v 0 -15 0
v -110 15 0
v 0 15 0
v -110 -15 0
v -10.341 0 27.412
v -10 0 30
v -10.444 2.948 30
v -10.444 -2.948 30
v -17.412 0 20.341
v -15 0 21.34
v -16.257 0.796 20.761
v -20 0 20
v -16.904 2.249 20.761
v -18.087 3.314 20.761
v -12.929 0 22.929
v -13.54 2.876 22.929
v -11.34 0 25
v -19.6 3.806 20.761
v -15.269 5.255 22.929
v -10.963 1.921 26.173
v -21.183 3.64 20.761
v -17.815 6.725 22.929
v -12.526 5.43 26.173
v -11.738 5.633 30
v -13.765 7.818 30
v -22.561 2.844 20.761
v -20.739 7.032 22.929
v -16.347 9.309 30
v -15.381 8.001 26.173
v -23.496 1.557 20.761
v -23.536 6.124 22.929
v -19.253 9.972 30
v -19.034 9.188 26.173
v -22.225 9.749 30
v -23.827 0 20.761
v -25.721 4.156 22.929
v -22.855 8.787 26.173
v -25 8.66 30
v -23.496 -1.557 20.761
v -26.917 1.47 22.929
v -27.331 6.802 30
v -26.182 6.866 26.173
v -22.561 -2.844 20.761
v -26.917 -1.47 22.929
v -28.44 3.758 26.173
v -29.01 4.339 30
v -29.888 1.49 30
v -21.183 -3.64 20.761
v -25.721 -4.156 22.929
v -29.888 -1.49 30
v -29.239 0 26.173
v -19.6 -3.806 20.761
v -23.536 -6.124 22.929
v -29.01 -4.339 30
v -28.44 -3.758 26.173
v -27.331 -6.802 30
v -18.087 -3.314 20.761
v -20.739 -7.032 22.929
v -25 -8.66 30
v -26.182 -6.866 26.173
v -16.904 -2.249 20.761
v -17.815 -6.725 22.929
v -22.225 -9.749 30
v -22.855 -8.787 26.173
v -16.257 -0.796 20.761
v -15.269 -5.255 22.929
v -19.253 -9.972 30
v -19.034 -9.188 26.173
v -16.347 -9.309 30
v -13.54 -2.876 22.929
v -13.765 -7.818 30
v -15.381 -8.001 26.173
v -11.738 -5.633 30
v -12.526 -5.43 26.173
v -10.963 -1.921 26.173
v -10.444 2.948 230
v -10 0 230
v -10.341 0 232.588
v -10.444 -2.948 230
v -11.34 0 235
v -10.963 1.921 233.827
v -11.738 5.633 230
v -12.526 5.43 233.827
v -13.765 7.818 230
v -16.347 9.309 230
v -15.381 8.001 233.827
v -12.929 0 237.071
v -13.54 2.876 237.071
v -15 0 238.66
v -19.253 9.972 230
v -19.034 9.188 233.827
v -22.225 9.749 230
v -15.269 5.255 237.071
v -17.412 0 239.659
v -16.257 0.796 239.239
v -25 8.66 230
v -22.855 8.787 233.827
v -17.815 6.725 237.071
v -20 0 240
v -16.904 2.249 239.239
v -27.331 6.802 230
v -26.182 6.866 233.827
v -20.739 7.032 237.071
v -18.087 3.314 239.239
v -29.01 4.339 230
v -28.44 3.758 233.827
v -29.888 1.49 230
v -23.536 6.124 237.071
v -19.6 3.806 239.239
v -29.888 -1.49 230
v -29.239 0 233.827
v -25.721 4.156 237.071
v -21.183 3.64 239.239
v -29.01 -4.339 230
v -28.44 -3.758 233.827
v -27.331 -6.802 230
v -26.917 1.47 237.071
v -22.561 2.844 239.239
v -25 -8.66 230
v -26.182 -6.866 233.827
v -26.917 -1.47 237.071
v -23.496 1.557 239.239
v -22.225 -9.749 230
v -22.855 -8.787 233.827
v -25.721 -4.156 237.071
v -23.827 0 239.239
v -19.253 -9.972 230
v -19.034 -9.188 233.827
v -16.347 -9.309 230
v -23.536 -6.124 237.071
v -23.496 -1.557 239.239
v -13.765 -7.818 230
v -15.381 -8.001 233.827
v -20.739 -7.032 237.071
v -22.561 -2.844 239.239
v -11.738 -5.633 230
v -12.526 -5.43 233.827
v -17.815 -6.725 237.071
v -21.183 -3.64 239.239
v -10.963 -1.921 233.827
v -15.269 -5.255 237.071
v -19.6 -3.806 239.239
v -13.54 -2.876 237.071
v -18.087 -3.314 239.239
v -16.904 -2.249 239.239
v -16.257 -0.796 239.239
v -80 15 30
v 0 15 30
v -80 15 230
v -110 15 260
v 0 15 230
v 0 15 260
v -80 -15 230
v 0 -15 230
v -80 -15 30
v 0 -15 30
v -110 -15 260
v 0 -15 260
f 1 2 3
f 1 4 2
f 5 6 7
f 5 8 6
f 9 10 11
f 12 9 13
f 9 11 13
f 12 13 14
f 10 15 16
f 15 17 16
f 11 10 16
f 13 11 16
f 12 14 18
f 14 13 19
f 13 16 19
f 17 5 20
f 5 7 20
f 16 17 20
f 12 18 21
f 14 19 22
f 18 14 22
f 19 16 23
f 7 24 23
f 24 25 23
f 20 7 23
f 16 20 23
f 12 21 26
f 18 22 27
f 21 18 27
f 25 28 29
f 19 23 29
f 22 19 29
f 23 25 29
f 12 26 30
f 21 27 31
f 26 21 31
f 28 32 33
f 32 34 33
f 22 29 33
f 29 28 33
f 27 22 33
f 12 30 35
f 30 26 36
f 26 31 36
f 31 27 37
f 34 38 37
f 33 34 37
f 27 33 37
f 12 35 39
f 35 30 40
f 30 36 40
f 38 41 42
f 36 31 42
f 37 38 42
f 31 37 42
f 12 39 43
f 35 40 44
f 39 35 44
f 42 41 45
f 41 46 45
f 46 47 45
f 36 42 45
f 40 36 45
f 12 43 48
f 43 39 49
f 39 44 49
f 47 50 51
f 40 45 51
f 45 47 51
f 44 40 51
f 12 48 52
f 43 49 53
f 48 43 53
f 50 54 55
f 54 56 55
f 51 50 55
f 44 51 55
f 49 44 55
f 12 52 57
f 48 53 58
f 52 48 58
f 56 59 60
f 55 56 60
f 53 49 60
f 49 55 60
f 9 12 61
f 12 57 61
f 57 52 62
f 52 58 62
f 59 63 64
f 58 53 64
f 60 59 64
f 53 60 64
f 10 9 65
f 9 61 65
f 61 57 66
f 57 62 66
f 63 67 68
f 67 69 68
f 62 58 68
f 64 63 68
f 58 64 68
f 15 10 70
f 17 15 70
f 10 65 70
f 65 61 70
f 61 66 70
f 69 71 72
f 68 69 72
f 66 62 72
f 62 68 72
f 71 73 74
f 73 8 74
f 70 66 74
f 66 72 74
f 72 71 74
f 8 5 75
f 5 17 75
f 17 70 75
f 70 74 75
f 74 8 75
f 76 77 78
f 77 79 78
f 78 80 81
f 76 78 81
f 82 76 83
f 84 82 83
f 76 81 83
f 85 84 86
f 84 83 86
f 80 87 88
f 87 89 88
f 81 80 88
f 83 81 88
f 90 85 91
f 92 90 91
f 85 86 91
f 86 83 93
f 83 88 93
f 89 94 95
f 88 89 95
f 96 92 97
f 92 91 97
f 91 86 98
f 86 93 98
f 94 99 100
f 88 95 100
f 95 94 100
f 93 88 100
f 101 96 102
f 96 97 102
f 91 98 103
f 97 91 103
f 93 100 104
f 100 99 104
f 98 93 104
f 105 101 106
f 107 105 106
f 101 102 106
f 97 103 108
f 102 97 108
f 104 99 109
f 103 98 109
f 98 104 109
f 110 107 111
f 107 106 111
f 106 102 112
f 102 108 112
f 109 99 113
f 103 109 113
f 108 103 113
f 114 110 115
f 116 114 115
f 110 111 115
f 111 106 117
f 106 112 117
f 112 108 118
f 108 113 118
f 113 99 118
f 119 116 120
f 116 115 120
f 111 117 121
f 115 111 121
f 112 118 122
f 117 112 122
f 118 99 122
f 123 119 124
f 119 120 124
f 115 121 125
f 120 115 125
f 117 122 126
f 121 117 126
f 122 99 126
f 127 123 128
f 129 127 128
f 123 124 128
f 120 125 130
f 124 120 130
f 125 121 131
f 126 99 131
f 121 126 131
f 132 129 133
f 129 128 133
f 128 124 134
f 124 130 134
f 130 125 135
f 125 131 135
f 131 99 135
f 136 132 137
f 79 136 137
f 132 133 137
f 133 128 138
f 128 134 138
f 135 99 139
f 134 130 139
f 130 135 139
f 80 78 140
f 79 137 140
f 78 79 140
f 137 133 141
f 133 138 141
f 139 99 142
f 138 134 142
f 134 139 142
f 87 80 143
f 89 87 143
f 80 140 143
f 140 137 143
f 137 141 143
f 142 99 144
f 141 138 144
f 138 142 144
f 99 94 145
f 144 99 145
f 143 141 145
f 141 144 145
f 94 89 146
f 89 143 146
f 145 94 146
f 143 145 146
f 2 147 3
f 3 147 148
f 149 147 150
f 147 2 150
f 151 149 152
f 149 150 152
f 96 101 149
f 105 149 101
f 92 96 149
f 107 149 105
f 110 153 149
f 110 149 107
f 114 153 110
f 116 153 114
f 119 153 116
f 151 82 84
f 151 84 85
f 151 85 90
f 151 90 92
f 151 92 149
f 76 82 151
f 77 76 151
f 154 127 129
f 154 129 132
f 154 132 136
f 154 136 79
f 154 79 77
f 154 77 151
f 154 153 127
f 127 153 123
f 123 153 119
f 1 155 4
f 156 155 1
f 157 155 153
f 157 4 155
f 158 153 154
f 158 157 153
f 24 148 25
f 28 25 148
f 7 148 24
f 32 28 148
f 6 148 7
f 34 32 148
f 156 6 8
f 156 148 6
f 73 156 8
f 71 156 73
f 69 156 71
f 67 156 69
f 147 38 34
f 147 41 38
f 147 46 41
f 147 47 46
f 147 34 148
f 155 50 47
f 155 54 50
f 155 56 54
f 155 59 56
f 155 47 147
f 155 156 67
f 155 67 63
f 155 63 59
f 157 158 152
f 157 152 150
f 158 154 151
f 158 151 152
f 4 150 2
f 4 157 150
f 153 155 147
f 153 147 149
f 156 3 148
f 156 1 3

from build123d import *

# Parameters (mm, degrees)
F1_DEPTH = 15


with BuildPart() as f1:
    # F0 (on Front) → F1 (new body, symmetric)
    with BuildSketch(Plane.XZ):
        Polygon((0, 0), (0, 30), (-80, 30), (-80, 230), (0, 230), (0, 260), (-110, 260), (-110, 0), align=None)
    extrude(amount=F1_DEPTH, both=True)

    # F2 (on Front) → F3 (revolve, cut)
    with BuildSketch(Plane.XZ):
        with BuildLine():
            Line((-20, 40), (-20, 20))
            ThreePointArc((-20, 20), (-10, 30), (-20, 40))
        make_face()
        with BuildLine():
            Line((-20, 240), (-20, 220))
            ThreePointArc((-20, 220), (-10, 230), (-20, 240))
        make_face()
    revolve(axis=Axis((-20, 0, 130), (0, 0, 1)), mode=Mode.SUBTRACT)


solid = f1.part
